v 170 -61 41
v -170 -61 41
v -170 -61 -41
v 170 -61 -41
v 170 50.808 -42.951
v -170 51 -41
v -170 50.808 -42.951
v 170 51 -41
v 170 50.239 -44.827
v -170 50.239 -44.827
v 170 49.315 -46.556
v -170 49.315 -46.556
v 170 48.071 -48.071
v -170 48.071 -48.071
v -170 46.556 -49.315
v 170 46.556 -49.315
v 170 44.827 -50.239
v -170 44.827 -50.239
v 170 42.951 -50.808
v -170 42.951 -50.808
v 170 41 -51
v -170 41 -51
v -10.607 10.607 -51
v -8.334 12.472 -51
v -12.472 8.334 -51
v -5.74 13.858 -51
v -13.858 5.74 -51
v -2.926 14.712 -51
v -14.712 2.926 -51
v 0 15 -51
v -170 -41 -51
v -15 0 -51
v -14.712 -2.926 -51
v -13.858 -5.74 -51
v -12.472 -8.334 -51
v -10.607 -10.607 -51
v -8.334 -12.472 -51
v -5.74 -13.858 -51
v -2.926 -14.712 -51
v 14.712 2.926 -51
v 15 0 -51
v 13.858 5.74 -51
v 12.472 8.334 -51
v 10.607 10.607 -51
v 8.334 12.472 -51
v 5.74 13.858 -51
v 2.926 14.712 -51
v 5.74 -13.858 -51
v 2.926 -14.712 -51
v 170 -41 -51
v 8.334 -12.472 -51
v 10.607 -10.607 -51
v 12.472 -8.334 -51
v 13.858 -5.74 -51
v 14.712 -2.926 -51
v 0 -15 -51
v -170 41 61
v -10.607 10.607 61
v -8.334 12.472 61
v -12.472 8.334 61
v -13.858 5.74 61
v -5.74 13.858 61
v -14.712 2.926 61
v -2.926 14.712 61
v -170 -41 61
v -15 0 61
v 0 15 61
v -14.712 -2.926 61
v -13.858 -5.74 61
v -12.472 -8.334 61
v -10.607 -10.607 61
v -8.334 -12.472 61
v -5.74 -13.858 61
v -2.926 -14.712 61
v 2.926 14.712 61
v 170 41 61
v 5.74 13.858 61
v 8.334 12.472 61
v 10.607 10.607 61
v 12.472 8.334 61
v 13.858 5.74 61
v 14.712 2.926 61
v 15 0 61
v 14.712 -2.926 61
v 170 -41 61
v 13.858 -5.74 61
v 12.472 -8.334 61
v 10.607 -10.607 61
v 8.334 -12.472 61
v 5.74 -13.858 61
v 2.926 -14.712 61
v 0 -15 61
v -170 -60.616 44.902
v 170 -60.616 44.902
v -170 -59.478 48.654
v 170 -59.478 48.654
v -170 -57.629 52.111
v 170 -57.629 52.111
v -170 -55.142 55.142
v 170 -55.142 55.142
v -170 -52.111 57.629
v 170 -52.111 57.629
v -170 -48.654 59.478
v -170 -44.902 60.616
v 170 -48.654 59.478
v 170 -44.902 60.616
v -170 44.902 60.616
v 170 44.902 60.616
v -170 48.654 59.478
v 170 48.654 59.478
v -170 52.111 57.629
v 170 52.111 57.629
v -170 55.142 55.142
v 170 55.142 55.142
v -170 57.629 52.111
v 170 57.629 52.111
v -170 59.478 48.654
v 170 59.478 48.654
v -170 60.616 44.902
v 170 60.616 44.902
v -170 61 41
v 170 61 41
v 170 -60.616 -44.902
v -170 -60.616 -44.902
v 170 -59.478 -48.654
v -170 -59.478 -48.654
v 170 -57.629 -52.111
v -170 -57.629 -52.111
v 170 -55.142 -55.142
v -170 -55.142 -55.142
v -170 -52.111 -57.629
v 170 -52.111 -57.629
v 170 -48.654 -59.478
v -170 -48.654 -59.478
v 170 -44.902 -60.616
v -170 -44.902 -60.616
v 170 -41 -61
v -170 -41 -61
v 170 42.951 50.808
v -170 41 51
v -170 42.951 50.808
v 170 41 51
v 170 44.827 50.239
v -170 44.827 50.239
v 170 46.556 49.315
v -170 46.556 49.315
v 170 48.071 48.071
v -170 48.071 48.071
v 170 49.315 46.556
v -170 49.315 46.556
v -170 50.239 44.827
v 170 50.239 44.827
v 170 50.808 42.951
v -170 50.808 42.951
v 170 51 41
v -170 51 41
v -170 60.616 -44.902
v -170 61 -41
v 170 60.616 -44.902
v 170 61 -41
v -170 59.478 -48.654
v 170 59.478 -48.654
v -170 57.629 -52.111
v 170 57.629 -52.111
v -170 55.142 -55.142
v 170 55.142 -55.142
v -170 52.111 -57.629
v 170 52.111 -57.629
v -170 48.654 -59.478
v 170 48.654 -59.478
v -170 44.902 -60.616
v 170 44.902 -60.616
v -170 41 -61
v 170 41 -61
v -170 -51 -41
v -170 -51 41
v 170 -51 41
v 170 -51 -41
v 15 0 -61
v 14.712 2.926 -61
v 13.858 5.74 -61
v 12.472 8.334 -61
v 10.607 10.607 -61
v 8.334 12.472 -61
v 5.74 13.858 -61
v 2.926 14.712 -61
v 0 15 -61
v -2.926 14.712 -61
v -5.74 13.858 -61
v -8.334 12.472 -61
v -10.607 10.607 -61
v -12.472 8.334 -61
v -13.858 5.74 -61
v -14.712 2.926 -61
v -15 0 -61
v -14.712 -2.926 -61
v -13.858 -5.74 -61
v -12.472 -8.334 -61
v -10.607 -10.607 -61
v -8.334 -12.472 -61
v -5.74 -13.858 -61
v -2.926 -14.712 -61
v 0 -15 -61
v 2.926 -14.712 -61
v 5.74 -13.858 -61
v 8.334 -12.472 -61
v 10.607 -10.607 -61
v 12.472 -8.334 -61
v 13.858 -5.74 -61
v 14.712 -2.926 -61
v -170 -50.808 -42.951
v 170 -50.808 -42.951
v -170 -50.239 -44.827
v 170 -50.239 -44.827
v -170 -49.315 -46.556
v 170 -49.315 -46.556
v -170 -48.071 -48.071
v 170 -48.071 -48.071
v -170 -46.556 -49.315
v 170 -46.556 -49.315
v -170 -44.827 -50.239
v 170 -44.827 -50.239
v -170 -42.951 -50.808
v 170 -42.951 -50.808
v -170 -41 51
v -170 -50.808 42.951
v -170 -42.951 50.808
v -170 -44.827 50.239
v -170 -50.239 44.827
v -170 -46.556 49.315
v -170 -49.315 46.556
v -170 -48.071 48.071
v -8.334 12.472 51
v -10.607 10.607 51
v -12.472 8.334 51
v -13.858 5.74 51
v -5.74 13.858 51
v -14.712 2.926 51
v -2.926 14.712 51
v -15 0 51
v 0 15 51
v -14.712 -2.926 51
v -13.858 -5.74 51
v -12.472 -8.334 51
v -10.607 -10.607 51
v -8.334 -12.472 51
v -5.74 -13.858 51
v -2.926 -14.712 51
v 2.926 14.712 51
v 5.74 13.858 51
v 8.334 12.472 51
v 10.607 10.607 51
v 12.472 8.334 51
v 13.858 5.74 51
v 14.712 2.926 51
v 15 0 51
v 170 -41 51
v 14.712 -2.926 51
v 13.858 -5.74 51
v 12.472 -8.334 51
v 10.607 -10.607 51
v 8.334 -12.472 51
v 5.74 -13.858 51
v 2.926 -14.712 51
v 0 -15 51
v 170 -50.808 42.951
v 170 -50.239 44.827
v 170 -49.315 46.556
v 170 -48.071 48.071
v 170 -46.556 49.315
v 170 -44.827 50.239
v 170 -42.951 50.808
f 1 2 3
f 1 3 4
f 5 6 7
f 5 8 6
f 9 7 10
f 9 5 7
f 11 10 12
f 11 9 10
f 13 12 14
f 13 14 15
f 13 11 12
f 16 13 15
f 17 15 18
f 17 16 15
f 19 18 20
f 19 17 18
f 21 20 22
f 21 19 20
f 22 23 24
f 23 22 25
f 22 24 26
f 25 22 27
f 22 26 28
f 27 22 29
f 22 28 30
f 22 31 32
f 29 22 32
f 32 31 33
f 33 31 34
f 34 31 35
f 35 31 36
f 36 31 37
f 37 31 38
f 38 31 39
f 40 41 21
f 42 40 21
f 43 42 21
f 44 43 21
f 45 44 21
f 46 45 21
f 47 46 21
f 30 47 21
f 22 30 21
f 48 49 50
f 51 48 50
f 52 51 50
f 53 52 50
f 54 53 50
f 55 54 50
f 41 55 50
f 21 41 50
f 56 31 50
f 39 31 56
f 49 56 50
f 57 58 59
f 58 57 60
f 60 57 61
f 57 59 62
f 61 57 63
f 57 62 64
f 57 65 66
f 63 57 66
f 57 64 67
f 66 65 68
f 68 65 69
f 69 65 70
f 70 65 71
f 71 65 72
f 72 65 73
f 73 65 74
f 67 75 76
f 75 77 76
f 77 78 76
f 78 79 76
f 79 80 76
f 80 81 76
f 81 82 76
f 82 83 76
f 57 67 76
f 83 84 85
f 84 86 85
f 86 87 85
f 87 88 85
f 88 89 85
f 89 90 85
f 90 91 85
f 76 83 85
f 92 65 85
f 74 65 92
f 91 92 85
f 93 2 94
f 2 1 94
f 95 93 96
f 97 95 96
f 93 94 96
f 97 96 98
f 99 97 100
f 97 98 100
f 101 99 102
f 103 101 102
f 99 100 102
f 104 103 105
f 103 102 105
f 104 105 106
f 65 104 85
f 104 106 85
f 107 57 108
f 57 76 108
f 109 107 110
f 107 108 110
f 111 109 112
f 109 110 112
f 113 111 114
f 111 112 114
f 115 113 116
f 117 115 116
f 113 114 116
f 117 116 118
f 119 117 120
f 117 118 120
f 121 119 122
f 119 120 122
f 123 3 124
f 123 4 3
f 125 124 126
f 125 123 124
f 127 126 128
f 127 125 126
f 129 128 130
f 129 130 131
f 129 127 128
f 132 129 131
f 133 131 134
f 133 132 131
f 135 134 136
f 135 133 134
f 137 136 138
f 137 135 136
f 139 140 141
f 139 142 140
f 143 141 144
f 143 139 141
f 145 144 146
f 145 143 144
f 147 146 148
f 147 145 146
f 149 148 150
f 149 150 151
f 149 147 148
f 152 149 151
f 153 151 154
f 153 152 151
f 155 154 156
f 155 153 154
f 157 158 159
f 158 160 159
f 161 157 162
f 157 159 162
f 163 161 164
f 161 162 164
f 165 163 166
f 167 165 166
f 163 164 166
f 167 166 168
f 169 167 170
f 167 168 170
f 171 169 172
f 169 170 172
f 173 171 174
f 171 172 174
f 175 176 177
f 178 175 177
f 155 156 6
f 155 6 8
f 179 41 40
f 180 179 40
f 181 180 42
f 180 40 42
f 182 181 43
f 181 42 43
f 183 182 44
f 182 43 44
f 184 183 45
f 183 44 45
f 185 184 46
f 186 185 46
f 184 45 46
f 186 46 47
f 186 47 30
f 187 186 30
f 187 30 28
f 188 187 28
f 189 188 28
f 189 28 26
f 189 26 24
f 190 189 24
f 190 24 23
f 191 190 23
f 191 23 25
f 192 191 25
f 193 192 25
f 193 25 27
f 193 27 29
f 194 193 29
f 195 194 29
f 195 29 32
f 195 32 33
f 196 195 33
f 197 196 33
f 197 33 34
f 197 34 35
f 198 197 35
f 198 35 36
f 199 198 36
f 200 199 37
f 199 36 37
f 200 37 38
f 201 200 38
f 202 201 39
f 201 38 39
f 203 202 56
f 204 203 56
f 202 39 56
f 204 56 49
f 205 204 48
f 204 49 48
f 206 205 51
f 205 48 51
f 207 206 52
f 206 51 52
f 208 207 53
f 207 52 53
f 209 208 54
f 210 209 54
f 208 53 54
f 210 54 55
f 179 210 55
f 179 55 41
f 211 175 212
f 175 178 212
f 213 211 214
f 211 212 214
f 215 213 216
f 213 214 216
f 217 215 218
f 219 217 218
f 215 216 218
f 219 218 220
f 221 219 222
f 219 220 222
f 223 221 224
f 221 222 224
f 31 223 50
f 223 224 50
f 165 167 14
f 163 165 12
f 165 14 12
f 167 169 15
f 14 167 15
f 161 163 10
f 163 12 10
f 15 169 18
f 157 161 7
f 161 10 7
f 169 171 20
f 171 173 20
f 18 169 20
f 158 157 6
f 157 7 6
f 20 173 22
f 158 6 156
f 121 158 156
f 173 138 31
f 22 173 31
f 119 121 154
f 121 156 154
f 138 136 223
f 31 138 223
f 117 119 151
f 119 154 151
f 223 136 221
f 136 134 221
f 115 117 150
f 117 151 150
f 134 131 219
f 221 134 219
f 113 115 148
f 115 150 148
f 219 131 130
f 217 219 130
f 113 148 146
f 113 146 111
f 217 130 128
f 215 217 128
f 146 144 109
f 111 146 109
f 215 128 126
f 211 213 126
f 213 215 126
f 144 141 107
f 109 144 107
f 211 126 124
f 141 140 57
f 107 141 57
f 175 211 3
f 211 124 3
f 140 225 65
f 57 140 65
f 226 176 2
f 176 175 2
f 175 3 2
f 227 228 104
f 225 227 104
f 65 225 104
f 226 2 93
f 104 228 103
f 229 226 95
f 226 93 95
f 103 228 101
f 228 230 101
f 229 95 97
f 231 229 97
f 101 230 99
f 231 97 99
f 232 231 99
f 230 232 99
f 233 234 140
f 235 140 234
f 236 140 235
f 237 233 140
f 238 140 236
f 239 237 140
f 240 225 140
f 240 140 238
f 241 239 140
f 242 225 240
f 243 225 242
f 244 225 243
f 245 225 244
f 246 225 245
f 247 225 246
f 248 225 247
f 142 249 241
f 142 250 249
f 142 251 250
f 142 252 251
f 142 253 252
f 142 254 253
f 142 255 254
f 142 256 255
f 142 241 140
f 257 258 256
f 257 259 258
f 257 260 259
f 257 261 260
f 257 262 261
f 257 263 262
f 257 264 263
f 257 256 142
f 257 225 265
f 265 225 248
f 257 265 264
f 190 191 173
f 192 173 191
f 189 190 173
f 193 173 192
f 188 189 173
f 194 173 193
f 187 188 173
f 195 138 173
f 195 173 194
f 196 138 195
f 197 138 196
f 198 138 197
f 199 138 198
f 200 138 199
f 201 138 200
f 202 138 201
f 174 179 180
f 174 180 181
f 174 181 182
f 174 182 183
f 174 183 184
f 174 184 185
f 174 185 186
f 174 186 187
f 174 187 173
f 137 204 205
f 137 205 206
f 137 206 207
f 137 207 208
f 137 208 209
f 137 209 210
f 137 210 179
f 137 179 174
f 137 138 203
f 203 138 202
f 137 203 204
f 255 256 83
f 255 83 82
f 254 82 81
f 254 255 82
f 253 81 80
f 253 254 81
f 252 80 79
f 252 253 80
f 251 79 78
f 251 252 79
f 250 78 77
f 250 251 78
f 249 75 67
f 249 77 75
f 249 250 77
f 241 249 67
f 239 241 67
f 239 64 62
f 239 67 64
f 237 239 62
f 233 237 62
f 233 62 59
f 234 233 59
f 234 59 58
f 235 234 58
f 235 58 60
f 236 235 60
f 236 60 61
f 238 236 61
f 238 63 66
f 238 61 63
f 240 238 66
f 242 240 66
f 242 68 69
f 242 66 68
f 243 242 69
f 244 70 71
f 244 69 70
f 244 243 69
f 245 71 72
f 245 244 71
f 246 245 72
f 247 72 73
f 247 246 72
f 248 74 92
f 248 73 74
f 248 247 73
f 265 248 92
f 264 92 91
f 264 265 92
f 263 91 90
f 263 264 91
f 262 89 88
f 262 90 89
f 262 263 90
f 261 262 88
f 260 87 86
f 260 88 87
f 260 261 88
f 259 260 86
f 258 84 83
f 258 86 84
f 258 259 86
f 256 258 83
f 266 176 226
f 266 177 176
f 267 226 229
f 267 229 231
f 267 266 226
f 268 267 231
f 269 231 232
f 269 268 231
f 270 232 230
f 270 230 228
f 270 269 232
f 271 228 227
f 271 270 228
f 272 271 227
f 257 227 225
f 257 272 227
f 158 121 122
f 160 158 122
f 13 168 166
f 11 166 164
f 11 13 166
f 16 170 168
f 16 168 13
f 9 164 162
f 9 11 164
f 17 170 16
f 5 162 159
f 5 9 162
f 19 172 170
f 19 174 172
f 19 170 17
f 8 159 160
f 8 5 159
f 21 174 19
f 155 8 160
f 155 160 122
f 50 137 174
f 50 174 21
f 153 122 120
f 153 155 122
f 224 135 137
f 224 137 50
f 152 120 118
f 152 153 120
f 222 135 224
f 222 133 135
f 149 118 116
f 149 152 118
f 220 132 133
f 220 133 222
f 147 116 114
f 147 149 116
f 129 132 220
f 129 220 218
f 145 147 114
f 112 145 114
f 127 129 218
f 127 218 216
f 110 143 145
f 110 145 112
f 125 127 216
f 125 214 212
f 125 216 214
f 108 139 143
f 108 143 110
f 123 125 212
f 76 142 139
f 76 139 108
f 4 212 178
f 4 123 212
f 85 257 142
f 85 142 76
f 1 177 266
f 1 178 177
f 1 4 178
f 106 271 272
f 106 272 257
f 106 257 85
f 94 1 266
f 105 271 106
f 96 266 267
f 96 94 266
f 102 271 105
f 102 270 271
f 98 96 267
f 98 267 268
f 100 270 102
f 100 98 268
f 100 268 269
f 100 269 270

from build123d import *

# Parameters (mm, degrees)
F0_W          = 340
F0_H          = 122
F1_DEPTH      = 61
F2_R          = 20
F3_T          = -10
F4_R          = 15
F5_DEPTH      = 61.001
F5_DEPTH_BACK = 61.001


with BuildPart() as f1:
    # F0 (on Front) → F1 (new body, symmetric)
    with BuildSketch(Plane.XZ):
        Rectangle(F0_W, F0_H)
    extrude(amount=F1_DEPTH, both=True)

    # F2
    f2_edges = [f1.edges().sort_by_distance(p)[0] for p in [
        (0, 61, 61),
        (0, -61, 61),
        (0, 61, -61),
        (0, -61, -61),
    ]]
    fillet(f2_edges, radius=F2_R)

    # F3
    f3_openings = [f1.faces().sort_by_distance(p)[0] for p in [
        (170, 0, 0),
        (-170, 0, 0),
    ]]
    offset(amount=F3_T, openings=f3_openings)

    # F4 (on Top) → F5 (cut, two sides)
    with BuildSketch(Plane.XY) as f5_sk:
        Circle(F4_R)
    extrude(amount=F5_DEPTH, mode=Mode.SUBTRACT)
    extrude(f5_sk.sketch, amount=-F5_DEPTH_BACK, mode=Mode.SUBTRACT)


solid = f1.part
